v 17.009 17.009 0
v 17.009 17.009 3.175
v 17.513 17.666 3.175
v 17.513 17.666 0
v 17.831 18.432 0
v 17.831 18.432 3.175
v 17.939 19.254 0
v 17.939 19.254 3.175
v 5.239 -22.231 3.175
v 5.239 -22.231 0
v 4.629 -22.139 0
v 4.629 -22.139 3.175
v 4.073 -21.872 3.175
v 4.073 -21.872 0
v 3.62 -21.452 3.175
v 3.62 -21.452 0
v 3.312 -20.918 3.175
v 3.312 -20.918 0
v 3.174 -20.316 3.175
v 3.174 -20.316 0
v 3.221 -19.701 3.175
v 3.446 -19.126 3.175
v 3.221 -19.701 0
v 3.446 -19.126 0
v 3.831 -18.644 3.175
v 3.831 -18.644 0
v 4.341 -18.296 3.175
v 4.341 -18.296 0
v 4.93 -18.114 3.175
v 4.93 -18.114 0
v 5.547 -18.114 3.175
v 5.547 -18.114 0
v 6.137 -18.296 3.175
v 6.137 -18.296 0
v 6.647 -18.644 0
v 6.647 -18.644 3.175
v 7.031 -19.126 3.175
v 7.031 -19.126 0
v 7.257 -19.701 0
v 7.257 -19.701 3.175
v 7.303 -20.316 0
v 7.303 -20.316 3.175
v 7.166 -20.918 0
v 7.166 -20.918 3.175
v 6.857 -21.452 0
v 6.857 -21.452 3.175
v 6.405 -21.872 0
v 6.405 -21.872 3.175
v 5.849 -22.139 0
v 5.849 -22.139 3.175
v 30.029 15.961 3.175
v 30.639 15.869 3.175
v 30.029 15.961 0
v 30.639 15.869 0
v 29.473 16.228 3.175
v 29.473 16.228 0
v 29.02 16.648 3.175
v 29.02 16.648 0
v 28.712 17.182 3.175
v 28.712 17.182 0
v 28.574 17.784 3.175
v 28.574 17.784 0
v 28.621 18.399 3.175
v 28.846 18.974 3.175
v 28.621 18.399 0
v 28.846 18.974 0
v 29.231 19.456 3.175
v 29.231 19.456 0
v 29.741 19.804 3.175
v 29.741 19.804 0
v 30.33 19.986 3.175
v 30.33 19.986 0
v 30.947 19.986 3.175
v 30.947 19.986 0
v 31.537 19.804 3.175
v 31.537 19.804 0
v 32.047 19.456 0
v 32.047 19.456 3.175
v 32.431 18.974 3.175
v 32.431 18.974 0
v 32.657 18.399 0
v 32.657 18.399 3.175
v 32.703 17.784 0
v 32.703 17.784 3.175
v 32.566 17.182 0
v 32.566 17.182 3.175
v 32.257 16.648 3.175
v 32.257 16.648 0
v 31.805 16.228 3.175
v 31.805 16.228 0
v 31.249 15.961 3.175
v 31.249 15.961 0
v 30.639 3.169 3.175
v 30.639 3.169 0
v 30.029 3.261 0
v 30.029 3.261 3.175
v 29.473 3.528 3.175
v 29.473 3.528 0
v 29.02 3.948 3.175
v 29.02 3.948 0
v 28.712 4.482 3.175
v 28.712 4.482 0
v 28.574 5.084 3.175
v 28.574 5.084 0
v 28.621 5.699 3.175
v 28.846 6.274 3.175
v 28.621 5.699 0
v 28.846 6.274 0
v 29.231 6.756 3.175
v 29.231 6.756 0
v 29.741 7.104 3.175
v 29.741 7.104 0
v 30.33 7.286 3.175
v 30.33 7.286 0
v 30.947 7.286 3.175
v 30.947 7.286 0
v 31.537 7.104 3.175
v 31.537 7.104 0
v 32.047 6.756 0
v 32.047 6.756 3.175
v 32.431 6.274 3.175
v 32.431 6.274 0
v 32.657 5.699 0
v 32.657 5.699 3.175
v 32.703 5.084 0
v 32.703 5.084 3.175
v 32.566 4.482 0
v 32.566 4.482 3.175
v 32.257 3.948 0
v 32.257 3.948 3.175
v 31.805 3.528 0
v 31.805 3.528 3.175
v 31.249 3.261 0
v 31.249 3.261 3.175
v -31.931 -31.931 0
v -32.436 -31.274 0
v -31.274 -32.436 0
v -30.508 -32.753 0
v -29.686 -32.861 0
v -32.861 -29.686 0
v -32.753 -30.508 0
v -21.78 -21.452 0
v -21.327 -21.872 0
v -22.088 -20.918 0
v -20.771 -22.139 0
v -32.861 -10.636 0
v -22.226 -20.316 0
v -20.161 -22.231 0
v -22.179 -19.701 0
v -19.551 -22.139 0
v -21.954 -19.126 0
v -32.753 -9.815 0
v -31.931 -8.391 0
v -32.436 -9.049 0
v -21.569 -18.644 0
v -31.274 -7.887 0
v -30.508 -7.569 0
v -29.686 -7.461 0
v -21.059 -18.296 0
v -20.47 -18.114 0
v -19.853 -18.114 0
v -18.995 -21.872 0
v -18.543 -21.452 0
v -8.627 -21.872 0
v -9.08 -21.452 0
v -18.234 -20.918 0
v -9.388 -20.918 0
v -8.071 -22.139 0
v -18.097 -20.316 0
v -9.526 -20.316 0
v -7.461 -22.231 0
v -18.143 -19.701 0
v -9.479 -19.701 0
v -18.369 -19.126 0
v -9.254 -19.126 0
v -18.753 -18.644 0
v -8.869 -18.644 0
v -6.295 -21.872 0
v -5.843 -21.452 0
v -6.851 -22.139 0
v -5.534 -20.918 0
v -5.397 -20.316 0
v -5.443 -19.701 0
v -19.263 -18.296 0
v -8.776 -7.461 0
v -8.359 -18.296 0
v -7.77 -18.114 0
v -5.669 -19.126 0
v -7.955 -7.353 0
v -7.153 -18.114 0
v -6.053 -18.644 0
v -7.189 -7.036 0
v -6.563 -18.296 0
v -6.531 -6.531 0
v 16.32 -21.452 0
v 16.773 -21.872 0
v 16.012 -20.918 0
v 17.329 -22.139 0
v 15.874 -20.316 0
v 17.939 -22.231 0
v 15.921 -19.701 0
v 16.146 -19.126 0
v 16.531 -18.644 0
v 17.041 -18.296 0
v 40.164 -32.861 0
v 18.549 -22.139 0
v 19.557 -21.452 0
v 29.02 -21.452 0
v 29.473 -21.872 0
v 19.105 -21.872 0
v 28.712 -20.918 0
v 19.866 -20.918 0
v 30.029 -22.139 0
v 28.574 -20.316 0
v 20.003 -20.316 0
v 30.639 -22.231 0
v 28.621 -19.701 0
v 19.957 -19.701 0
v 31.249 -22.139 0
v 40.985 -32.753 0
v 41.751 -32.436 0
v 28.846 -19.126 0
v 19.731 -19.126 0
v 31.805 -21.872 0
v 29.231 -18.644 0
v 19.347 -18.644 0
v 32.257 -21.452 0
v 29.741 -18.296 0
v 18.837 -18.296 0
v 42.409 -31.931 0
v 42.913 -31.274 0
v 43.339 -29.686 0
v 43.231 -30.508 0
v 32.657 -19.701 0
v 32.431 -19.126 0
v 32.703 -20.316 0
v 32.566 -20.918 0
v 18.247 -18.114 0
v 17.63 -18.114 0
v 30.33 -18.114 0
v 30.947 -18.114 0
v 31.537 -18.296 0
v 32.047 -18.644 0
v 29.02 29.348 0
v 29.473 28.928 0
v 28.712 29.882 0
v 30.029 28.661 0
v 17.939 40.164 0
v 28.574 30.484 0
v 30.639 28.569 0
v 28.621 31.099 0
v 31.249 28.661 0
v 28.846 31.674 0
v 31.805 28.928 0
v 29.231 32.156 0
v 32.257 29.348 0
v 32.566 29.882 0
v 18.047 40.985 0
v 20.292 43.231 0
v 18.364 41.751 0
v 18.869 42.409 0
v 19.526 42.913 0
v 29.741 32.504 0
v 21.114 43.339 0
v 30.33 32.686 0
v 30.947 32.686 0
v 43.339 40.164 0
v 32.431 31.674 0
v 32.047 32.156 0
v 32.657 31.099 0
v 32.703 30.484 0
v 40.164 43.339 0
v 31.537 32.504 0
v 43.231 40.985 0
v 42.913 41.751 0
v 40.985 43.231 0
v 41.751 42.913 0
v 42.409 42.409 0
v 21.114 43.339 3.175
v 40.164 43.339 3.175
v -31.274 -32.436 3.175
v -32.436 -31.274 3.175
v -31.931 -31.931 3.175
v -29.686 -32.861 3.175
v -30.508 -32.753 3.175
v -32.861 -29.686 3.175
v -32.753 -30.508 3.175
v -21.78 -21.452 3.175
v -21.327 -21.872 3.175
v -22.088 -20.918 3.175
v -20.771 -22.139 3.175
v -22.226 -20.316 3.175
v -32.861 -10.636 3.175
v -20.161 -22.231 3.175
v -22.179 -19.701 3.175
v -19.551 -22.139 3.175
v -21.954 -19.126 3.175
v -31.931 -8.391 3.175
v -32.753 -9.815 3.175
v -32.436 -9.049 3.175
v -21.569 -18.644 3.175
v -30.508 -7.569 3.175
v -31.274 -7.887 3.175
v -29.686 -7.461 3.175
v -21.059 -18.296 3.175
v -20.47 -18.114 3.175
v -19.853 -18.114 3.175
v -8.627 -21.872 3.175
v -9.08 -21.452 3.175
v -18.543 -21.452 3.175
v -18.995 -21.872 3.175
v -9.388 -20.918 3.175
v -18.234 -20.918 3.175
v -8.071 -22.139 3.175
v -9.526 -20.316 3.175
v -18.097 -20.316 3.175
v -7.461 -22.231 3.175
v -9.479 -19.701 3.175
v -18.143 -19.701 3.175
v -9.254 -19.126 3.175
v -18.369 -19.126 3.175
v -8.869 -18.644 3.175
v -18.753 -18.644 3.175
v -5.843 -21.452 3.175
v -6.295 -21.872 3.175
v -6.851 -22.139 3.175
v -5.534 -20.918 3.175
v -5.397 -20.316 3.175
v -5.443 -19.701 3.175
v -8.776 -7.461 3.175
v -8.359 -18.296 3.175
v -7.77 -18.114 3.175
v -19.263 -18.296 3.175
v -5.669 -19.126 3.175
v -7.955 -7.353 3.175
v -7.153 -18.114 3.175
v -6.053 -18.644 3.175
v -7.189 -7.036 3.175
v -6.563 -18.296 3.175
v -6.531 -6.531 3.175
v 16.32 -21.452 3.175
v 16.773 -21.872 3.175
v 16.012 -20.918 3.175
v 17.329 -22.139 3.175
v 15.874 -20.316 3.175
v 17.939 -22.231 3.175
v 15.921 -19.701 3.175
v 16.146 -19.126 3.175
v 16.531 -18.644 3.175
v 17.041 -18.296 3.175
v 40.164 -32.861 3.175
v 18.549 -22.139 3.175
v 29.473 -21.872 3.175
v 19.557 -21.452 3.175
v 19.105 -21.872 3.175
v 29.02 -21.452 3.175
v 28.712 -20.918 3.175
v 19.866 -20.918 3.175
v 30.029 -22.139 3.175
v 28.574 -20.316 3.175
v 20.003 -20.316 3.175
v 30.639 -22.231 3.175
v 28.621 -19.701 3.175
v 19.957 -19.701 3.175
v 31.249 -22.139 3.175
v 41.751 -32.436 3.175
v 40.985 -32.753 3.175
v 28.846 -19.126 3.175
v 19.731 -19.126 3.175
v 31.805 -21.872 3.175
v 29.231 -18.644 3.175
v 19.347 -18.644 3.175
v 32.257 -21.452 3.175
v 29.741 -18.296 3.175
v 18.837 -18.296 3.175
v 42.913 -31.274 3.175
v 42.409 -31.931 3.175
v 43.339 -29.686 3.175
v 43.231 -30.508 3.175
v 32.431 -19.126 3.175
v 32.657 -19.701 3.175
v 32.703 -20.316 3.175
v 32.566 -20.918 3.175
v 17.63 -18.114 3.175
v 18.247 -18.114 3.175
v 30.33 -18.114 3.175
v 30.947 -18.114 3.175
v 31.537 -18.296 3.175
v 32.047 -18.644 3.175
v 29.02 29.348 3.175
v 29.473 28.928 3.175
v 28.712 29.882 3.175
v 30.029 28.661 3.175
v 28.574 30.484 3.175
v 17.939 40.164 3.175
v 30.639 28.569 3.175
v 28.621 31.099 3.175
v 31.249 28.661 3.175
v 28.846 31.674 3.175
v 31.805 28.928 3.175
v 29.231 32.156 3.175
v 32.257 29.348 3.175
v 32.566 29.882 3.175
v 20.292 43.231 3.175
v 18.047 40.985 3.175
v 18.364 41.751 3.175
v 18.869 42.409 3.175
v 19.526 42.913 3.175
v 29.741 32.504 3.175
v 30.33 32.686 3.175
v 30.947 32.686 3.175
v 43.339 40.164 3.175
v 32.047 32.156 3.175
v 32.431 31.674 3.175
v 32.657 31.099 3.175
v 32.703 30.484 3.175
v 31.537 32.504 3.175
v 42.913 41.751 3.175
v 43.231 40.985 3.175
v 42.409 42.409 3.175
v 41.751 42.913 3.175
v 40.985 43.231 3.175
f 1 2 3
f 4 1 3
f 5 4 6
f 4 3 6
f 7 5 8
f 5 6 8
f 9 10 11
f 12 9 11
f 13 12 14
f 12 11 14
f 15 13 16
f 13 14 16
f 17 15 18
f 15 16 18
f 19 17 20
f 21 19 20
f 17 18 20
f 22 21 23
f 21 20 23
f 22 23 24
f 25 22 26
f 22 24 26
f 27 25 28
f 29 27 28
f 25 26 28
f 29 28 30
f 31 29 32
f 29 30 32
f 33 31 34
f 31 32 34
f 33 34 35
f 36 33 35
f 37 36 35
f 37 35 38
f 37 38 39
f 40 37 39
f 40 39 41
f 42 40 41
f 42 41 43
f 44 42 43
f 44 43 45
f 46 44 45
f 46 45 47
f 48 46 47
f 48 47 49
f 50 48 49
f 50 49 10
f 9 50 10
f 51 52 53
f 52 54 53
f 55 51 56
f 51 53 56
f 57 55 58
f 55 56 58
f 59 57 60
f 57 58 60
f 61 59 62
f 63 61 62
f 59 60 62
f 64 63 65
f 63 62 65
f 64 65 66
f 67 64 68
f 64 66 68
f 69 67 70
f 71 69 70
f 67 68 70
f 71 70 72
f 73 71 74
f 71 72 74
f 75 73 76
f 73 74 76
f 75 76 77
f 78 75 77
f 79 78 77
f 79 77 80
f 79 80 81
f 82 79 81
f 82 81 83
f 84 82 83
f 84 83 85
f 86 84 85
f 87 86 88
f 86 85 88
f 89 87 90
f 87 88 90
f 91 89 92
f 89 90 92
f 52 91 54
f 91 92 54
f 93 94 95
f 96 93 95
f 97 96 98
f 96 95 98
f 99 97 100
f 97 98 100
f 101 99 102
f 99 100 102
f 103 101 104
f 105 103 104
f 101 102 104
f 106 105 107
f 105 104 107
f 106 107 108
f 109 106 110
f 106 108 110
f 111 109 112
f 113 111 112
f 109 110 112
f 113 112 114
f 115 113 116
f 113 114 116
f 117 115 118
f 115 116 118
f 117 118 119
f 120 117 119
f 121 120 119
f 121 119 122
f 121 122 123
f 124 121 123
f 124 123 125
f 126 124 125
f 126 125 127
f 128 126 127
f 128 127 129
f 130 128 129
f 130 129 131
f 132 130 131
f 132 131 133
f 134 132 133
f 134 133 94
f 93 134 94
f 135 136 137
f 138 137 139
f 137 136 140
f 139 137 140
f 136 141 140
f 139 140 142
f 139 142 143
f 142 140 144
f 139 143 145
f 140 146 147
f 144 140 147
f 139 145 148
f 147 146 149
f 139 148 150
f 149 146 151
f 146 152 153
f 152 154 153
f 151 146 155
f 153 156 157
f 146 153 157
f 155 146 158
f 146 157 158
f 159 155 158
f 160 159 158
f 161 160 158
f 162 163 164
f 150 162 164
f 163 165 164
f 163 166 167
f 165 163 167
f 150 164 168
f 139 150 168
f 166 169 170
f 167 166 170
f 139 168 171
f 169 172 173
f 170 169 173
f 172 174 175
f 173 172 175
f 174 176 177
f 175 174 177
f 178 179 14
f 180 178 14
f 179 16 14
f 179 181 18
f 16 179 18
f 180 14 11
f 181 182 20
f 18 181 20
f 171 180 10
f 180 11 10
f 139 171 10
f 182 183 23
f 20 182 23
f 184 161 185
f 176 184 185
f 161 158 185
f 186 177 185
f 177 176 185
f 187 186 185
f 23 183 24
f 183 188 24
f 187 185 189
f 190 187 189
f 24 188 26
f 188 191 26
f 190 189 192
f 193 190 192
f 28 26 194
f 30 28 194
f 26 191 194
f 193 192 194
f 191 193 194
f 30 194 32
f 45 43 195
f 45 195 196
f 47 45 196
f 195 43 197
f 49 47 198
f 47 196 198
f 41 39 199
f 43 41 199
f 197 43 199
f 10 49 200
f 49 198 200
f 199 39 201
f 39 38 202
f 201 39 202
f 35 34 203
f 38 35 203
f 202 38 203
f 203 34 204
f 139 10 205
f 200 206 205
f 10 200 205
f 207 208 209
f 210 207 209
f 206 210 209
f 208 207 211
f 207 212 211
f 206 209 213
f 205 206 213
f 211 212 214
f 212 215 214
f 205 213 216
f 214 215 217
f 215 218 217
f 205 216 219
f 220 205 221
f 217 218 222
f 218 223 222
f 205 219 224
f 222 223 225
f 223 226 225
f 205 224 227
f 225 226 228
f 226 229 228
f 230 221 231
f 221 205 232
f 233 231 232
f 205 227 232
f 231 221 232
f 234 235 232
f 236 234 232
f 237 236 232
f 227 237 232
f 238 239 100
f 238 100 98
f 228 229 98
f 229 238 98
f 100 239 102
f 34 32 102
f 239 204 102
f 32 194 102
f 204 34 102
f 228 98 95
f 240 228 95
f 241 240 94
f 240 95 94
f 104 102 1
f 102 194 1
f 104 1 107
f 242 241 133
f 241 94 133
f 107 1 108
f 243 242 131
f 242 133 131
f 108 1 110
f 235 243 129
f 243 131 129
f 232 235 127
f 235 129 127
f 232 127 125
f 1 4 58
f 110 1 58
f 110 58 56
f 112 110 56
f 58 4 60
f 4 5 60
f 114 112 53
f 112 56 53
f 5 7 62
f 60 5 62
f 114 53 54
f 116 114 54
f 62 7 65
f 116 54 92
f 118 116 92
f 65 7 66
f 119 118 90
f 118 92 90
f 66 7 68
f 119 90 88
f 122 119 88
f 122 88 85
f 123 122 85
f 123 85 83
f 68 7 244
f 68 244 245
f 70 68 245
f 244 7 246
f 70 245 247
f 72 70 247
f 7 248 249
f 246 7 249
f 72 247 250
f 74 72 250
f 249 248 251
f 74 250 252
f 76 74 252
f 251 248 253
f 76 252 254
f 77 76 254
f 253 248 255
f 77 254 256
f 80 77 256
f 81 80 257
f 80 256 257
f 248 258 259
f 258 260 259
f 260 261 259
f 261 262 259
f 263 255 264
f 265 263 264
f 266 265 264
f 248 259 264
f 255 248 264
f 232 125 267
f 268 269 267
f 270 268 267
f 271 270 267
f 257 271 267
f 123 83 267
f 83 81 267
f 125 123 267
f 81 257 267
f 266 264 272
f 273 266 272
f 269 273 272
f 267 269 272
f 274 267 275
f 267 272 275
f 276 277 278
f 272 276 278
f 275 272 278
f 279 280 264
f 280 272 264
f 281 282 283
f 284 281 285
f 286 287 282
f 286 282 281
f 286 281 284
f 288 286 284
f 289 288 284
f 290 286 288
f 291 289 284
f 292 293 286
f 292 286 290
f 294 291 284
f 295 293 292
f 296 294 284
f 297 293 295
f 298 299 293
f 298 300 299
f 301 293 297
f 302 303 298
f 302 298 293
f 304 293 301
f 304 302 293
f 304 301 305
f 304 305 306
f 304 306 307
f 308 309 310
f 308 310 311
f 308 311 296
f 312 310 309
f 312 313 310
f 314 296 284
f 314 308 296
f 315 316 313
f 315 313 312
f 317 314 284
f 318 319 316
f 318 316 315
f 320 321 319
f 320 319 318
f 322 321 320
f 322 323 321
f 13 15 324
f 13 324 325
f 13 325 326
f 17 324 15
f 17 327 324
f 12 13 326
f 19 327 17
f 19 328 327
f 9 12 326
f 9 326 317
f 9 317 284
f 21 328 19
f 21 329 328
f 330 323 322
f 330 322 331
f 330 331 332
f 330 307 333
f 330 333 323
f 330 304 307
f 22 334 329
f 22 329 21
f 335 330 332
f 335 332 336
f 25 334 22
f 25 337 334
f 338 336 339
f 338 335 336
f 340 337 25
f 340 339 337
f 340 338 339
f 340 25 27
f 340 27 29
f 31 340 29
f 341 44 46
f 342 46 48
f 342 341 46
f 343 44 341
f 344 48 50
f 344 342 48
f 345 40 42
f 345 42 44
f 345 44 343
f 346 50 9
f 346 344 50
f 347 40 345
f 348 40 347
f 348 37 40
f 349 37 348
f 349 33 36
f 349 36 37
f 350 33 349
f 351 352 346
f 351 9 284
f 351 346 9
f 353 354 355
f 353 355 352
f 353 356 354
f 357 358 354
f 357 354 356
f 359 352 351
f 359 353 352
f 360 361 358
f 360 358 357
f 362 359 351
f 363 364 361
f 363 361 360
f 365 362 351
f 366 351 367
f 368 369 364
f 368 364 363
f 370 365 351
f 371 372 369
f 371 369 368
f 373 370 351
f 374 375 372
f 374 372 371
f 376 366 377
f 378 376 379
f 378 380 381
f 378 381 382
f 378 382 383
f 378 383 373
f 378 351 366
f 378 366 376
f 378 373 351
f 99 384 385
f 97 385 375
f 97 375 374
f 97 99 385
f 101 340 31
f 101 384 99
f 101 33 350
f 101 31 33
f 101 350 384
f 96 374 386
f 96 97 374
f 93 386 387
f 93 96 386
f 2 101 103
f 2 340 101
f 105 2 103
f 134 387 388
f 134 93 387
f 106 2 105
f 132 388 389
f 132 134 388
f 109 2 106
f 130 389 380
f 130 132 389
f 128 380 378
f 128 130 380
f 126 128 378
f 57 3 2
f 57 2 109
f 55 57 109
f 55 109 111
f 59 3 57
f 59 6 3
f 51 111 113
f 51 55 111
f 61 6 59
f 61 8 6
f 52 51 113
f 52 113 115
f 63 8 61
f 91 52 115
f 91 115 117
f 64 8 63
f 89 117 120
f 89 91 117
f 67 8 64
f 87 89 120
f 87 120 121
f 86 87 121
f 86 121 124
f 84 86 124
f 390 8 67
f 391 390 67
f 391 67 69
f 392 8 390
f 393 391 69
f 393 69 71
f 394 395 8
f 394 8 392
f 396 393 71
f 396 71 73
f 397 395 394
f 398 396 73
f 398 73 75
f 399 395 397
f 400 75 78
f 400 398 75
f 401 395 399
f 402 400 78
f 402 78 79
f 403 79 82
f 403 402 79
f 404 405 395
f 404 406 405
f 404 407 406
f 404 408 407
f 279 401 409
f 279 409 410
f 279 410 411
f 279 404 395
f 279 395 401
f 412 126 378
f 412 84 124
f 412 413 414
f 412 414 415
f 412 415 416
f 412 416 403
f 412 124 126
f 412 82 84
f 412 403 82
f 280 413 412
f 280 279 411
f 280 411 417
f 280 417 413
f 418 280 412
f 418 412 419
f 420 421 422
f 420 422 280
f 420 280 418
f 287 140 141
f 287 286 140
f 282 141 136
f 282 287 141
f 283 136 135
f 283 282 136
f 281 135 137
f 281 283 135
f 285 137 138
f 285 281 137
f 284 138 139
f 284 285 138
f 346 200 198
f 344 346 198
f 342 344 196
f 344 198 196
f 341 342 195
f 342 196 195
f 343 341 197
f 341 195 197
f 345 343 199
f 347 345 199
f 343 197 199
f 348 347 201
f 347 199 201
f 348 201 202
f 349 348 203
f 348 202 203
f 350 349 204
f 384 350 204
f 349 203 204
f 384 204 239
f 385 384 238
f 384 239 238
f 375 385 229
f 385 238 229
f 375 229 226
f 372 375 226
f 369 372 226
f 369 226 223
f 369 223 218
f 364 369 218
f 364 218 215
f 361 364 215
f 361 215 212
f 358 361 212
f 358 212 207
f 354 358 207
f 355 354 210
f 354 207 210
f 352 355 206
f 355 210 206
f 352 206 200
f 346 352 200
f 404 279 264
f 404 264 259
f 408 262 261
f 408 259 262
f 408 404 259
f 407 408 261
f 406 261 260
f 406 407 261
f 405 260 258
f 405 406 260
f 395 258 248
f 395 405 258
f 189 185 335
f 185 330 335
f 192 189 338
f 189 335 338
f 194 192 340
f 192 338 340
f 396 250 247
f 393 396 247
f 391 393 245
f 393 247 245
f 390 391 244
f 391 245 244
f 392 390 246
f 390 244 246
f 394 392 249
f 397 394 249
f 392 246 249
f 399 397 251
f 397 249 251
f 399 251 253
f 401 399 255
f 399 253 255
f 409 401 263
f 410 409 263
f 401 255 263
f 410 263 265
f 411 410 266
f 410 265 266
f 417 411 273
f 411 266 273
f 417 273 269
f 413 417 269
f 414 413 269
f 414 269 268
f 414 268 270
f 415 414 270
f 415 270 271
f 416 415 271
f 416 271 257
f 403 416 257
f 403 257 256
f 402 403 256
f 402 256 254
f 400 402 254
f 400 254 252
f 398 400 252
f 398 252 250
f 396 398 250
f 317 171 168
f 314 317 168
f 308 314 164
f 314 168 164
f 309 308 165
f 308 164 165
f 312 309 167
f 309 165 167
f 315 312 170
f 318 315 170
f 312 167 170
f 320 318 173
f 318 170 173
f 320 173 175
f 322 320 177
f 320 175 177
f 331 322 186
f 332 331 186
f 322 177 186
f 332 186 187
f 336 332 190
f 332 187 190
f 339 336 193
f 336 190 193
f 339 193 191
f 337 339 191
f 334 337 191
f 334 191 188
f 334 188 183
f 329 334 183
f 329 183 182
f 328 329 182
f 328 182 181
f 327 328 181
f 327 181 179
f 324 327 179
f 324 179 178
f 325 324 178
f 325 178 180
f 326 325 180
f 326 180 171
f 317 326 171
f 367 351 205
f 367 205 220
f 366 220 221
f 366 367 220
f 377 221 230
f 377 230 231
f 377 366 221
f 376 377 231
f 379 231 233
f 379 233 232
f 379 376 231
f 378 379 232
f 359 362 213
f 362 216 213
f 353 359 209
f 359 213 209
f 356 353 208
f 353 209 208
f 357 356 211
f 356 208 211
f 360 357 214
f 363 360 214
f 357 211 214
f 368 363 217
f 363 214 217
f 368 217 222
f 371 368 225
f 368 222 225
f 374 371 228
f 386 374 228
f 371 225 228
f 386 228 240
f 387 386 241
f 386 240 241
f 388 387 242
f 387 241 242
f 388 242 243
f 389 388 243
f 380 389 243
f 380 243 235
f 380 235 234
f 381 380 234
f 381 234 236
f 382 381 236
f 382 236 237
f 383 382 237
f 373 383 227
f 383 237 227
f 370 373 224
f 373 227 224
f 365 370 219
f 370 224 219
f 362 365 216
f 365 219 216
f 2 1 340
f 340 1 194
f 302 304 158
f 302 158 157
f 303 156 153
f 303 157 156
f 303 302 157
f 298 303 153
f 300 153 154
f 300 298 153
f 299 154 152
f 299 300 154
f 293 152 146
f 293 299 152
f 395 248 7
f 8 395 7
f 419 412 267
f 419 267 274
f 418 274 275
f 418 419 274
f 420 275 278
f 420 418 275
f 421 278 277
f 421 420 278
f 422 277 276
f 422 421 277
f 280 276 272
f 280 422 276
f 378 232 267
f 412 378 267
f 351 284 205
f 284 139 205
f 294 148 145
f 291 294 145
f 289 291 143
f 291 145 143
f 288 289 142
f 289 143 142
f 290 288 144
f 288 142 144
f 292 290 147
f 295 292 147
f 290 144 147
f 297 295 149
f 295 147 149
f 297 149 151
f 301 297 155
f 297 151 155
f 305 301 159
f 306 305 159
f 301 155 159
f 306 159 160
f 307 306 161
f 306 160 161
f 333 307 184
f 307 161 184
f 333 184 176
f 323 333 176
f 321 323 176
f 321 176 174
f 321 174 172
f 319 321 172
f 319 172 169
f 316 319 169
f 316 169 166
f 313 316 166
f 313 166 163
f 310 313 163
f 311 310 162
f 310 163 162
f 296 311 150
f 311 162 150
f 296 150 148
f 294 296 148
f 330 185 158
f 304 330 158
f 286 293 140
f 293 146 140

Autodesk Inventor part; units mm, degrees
ref_plane "YZ Plane" through (0, 0, 0) normal (1, 0, 0) x (0, 1, 0)
ref_plane "XZ Plane" through (0, 0, 0) normal (0, 1, 0) x (-1, 0, 0)
ref_plane "XY Plane" through (0, 0, 0) normal (0, 0, 1) x (1, 0, 0)
sketch "Sketch1" plane through (0, 0, 0) normal (0, 0, 1) x (1, 0, 0)
  line L0 (-32.8613, -32.8613) -> (43.3387, -32.8613)
  line L1 (43.3387, -32.8613) -> (43.3387, 43.3387)
  line L2 (-32.8613, -32.8613) -> (43.3387, 43.3387) construction
  line L3 (43.3387, 43.3387) -> (-32.8613, -32.8613)
  line L4 (43.3387, 43.3387) -> (17.9387, 43.3387)
  line L5 (17.9387, 43.3387) -> (17.9387, 17.9387)
  line L6 (43.3387, 22.2601) -> (43.3387, 43.3387)
  line L7 (-32.8613, -32.8613) -> (-7.4613, -32.8613)
  line L8 (-7.4613, -32.8613) -> (-7.4613, -7.4613)
  line L9 (-7.4613, -7.4613) -> (-32.8613, -7.4613)
  line L10 (-32.8613, -7.4613) -> (-32.8613, -32.8613)
  point P0 (0, 0)
  dimension "d1" = 76.2
  dimension "d2" = 76.2
  dimension "d7" = 25.4
  dimension "d8" = 25.4
extrude "Extrusion1" add sketch "Sketch1" along normal blind 3.175
fillet "Fillet2" radius 3.175 7 edges at (17.9387, 43.3387, 1.5875) (43.3387, 43.3387, 1.5875) (17.9387, 17.9387, 1.5875) (-7.4613, -7.4613, 1.5875) (-32.8613, -7.4613, 1.5875) (-32.8613, -32.8613, 1.5875) (43.3387, -32.8613, 1.5875)
sketch "Sketch2" plane through (0, 0, 3.175) normal (0, 0, 1) x (1, 0, 0)
  arc A0 (20.0074, -20.0851) -> (15.8701, -20.0851) centre (17.9387, -20.1613) ccw projected
  line L0 (20.0074, -20.0851) -> (28.5701, -20.0851) projected
  arc A1 (32.7074, -20.0851) -> (28.5701, -20.0851) centre (30.6387, -20.1613) ccw projected
  line L1 (32.7074, -20.0851) -> (43.3387, -20.0851) projected
  line L2 (43.3387, -20.0851) -> (43.3387, -7.4613) projected
  line L3 (-693.2613, -7.4613) -> (43.3387, -7.4613) projected
  line L4 (-693.2613, -7.4613) -> (-693.2613, -20.0851) projected
  line L5 (-693.2613, -20.0851) -> (-682.6299, -20.0851) projected
  arc A2 (-678.4926, -20.0851) -> (-682.6299, -20.0851) centre (-680.5613, -20.1613) ccw projected
  line L6 (-678.4926, -20.0851) -> (-669.9299, -20.0851) projected
  arc A3 (-665.7926, -20.0851) -> (-669.9299, -20.0851) centre (-667.8613, -20.1613) ccw projected
  line L7 (-665.7926, -20.0851) -> (-657.2299, -20.0851) projected
  arc A4 (-653.0926, -20.0851) -> (-657.2299, -20.0851) centre (-655.1613, -20.1613) ccw projected
  line L8 (-653.0926, -20.0851) -> (-644.5299, -20.0851) projected
  arc A5 (-640.3926, -20.0851) -> (-644.5299, -20.0851) centre (-642.4613, -20.1613) ccw projected
  line L9 (-640.3926, -20.0851) -> (-631.8299, -20.0851) projected
  arc A6 (-627.6926, -20.0851) -> (-631.8299, -20.0851) centre (-629.7613, -20.1613) ccw projected
  line L10 (-627.6926, -20.0851) -> (-272.9448, -20.0851) projected
  arc A7 (-242.32, -20.0851) -> (-272.9448, -20.0851) centre (-257.6324, -29.1216) ccw projected
  line L11 (-242.32, -20.0851) -> (-22.2299, -20.0851) projected
  arc A8 (-18.0926, -20.0851) -> (-22.2299, -20.0851) centre (-20.1613, -20.1613) ccw projected
  line L12 (-18.0926, -20.0851) -> (-9.5299, -20.0851) projected
  arc A9 (-5.3926, -20.0851) -> (-9.5299, -20.0851) centre (-7.4613, -20.1613) ccw projected
  line L13 (-5.3926, -20.0851) -> (3.1701, -20.0851) projected
  arc A10 (7.3074, -20.0851) -> (3.1701, -20.0851) centre (5.2387, -20.1613) ccw projected
  line L14 (7.3074, -20.0851) -> (15.8701, -20.0851) projected
  arc A11 (-84.7976, -15.8974) -> (-84.7976, -10.792) centre (-84.7976, -13.3447) ccw projected
  line L15 (-84.7976, -15.8974) -> (-94.3226, -15.8974) projected
  arc A12 (-94.3226, -10.792) -> (-94.3226, -15.8974) centre (-94.3226, -13.3447) ccw projected
  line L16 (-94.3226, -10.792) -> (-84.7976, -10.792) projected
  arc A13 (-604.3151, -10.792) -> (-604.3151, -15.8974) centre (-604.3151, -13.3447) ccw projected
  line L17 (-604.3151, -10.792) -> (-594.7901, -10.792) projected
  arc A14 (-594.7901, -15.8974) -> (-594.7901, -10.792) centre (-594.7901, -13.3447) ccw projected
  line L18 (-594.7901, -15.8974) -> (-604.3151, -15.8974) projected
  arc A15 (-564.9959, -10.792) -> (-564.9959, -15.8974) centre (-564.9959, -13.3447) ccw projected
  line L19 (-564.9959, -10.792) -> (-555.4709, -10.792) projected
  arc A16 (-555.4709, -15.8974) -> (-555.4709, -10.792) centre (-555.4709, -13.3447) ccw projected
  line L20 (-555.4709, -15.8974) -> (-564.9959, -15.8974) projected
  arc A17 (-55.0034, -10.792) -> (-55.0034, -15.8974) centre (-55.0034, -13.3447) ccw projected
  line L21 (-55.0034, -10.792) -> (-45.4784, -10.792) projected
  arc A18 (-45.4784, -15.8974) -> (-45.4784, -10.792) centre (-45.4784, -13.3447) ccw projected
  line L22 (-45.4784, -15.8974) -> (-55.0034, -15.8974) projected
  arc A19 (30.7149, 28.5701) -> (30.7149, 32.7074) centre (30.6387, 30.6387) ccw projected
  line L23 (30.7149, 20.0074) -> (30.7149, 28.5701) projected
  arc A20 (30.7149, 15.8701) -> (30.7149, 20.0074) centre (30.6387, 17.9387) ccw projected
  line L24 (30.7149, 7.3074) -> (30.7149, 15.8701) projected
  arc A21 (30.7149, 3.1701) -> (30.7149, 7.3074) centre (30.6387, 5.2387) ccw projected
  line L25 (30.7149, -7.4613) -> (30.7149, 3.1701) projected
  line L26 (43.3387, -7.4613) -> (30.7149, -7.4613) projected
  line L27 (43.3387, 221.1387) -> (43.3387, -7.4613) projected
  line L28 (43.3387, 221.1387) -> (30.7149, 221.1387) projected
  line L29 (30.7149, 190.6448) -> (30.7149, 221.1387) projected
  arc A22 (30.7149, 183.509) -> (30.7149, 190.6448) centre (30.6387, 187.0769) ccw projected
  line L30 (30.7149, 32.7074) -> (30.7149, 183.509) projected
  point P0 (0, 0)
  point P1 (30.6387, 5.2387)
  point P2 (30.6387, 30.6387)
hole "Hole1" at (30.6387, 30.6387, 3.175) at (30.6387, 5.2387, 3.175) at (30.6387, -20.1613, 3.175) at (5.2387, -20.1613, 3.175) at (-20.1613, -20.1613, 3.175) at (-7.4613, -20.1613, 3.175) at (17.9387, -20.1613, 3.175) at (30.6387, 17.9387, 3.175) direction (0, 0, -1) diameter 4.1402 end through all
properties part number "C21_TK_TriangleGusset" material "Aluminum 6061"
